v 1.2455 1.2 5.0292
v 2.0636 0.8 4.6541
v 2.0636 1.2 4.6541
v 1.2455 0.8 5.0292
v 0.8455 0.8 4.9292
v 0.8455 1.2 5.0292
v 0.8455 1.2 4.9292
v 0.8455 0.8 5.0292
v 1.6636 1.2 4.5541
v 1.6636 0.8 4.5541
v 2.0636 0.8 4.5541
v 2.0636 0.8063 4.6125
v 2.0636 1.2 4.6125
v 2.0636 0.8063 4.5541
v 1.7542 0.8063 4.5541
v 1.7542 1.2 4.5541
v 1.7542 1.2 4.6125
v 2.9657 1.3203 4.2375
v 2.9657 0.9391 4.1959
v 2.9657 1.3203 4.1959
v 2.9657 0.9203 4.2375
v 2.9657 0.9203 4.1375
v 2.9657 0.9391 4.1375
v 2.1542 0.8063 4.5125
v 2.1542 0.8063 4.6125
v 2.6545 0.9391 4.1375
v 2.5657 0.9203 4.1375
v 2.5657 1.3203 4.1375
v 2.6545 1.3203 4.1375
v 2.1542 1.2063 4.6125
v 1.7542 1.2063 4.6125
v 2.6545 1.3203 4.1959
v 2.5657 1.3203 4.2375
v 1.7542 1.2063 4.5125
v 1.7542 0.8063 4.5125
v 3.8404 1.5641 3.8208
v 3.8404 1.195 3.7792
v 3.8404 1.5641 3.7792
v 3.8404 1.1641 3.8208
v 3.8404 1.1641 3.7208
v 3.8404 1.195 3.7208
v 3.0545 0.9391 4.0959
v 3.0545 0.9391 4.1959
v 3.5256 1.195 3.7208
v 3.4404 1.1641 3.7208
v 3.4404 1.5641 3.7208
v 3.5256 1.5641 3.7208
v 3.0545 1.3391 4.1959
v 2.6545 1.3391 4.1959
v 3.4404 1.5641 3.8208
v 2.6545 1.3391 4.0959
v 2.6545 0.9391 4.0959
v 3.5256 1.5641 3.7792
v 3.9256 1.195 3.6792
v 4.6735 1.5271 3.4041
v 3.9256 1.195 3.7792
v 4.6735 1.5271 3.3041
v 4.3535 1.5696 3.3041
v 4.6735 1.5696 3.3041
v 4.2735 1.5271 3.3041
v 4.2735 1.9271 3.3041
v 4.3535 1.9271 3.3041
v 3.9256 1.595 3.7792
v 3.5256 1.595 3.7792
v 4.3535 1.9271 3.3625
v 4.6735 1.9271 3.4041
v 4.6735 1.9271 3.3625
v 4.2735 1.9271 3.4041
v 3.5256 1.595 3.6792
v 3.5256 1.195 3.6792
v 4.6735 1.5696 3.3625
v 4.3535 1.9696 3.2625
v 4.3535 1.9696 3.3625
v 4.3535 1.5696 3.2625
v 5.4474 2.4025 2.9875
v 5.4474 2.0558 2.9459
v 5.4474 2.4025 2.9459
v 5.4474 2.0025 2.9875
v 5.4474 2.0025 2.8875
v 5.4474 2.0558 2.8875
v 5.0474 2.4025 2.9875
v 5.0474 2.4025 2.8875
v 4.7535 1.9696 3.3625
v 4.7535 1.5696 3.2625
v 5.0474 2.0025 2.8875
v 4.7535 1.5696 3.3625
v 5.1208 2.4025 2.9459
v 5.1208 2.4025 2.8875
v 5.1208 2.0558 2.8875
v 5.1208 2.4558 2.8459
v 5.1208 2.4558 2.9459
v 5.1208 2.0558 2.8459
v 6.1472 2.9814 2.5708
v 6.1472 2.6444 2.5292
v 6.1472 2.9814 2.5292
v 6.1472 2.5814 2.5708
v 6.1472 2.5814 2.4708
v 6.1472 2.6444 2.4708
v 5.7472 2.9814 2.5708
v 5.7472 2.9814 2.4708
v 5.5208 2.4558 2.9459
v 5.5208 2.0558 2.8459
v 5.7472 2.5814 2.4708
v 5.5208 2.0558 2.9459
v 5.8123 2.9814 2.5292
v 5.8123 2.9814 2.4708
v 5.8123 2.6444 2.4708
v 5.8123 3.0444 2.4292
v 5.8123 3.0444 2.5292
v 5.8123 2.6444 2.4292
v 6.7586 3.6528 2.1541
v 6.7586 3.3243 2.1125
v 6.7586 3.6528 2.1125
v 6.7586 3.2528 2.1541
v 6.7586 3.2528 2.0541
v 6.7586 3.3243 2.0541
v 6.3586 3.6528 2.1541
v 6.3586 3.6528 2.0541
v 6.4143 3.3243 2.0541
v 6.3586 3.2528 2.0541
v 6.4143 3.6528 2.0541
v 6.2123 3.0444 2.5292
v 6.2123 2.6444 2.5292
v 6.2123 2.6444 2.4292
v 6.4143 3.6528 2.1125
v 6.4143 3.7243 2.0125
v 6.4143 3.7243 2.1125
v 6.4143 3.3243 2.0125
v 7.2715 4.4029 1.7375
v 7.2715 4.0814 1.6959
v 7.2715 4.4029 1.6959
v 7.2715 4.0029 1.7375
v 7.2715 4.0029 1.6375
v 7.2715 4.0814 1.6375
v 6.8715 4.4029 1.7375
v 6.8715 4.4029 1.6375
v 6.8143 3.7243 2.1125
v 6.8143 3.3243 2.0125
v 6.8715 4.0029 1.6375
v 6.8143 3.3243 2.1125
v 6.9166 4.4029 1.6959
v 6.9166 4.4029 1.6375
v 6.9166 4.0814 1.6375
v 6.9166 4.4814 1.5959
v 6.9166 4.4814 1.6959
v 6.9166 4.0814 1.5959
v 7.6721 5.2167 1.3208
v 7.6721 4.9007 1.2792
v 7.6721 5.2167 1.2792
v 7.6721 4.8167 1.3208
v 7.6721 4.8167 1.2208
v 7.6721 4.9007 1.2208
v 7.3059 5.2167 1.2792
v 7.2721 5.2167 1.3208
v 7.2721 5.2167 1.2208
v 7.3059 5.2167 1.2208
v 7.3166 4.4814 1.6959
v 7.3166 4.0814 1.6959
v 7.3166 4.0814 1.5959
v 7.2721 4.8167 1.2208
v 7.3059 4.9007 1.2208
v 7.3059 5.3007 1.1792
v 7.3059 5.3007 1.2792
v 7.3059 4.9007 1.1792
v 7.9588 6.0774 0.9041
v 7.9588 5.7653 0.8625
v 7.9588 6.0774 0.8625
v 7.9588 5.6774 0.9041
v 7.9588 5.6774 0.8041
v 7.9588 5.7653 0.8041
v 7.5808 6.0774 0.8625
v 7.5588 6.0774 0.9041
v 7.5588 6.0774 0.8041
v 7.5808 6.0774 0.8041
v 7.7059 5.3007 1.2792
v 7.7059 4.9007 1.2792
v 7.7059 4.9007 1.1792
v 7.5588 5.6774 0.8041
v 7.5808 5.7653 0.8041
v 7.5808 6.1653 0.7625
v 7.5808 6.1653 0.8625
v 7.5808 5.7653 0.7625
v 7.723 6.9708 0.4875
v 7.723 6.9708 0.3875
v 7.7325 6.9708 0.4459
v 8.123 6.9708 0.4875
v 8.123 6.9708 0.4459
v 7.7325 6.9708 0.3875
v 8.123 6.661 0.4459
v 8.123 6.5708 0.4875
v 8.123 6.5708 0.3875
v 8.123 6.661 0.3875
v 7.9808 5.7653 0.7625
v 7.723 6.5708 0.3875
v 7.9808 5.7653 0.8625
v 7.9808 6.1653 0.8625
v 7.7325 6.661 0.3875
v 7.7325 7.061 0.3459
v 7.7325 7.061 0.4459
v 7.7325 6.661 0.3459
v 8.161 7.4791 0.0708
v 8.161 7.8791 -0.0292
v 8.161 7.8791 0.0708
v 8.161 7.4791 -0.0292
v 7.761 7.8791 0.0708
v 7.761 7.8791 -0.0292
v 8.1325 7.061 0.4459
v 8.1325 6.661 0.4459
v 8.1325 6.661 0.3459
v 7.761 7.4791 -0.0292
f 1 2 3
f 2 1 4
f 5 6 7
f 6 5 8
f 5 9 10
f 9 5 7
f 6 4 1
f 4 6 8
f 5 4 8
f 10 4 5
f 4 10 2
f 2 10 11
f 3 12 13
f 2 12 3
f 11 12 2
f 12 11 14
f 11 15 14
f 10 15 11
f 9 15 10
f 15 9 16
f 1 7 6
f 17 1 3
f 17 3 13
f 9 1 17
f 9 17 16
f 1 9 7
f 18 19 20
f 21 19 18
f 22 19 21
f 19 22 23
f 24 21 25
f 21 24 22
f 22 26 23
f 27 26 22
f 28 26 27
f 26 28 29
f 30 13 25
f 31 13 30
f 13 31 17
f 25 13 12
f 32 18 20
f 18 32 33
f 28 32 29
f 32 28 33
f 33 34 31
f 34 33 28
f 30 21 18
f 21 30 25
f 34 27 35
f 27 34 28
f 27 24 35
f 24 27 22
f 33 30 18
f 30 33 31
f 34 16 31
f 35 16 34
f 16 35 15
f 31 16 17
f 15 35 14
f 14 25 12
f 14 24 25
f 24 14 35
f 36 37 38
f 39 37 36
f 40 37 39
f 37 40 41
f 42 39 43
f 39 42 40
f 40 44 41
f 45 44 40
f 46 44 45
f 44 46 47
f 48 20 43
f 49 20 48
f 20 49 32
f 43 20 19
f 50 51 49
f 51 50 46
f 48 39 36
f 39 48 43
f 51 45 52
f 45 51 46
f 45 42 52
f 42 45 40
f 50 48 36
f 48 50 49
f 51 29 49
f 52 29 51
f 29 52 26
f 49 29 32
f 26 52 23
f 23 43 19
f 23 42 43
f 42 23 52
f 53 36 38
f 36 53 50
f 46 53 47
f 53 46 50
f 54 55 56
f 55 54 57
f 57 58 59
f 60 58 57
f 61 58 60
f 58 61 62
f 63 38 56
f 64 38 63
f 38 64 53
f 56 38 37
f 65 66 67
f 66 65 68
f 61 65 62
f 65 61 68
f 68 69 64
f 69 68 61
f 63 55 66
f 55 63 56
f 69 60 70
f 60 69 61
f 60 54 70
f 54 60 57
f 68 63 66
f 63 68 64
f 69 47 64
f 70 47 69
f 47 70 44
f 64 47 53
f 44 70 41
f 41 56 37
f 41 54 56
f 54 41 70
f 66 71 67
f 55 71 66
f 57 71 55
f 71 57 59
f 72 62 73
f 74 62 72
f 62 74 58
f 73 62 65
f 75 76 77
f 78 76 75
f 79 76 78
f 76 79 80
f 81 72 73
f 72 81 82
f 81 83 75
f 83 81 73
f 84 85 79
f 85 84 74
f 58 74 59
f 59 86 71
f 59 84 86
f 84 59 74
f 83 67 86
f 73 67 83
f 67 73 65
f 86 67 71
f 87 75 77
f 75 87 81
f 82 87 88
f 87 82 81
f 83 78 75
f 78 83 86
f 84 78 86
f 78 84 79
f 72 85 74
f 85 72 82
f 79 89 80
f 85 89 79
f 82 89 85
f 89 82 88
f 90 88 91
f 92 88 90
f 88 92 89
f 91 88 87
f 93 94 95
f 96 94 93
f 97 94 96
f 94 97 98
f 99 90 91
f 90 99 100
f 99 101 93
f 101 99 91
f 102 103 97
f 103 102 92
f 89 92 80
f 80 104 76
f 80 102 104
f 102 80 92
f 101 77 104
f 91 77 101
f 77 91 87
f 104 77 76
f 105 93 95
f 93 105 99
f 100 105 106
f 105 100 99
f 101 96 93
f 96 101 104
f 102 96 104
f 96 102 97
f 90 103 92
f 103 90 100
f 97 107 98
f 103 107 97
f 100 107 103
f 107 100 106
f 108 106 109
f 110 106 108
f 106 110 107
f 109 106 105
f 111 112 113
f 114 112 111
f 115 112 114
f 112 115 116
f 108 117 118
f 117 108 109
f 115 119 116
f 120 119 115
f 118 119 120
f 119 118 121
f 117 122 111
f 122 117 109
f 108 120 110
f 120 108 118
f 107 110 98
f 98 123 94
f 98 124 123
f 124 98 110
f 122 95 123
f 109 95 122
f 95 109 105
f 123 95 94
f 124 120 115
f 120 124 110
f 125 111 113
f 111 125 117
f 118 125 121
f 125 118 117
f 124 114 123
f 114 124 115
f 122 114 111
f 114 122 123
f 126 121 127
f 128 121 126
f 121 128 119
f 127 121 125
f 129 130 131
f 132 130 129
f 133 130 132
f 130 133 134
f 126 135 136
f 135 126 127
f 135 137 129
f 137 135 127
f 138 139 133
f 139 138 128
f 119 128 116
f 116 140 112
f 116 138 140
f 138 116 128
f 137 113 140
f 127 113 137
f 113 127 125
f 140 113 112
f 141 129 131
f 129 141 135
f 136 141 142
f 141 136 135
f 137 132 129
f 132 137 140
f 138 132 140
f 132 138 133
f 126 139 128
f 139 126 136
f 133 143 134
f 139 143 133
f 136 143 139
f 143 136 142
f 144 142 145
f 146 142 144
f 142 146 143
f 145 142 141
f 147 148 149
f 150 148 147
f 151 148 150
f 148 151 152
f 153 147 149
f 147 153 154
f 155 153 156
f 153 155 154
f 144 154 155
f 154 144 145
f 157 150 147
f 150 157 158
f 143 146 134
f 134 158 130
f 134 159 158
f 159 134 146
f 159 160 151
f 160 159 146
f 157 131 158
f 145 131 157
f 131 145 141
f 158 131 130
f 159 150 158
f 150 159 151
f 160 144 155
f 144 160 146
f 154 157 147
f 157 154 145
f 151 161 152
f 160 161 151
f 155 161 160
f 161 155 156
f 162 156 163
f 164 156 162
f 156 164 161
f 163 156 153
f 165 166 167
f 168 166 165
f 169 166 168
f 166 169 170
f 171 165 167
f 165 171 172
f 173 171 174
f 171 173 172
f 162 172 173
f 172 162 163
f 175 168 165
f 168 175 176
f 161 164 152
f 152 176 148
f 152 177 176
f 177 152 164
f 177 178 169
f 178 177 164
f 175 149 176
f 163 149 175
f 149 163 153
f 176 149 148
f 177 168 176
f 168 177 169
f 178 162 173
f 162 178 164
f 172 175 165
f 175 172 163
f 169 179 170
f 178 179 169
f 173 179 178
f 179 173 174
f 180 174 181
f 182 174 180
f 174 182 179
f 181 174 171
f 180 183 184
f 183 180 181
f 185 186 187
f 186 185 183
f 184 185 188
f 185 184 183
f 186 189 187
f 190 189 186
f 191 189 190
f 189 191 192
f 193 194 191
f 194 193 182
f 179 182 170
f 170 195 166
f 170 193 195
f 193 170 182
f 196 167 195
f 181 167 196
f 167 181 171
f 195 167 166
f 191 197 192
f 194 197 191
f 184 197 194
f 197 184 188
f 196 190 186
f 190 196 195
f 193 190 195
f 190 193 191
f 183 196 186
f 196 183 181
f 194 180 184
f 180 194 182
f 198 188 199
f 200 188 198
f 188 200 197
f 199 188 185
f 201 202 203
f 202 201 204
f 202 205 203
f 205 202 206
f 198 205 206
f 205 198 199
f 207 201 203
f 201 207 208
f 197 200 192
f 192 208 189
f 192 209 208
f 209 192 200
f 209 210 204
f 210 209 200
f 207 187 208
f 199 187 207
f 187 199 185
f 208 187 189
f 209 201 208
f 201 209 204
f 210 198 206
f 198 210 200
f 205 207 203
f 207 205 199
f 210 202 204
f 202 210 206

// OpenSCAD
hull() {
    translate([1.045455, 1.0, 4.979165]) cube([0.4, 0.4, 0.1], center=true);
    translate([1.863645, 1.0, 4.604135]) cube([0.4, 0.4, 0.1], center=true);
}


hull() {
    translate([1.954185, 1.00633, 4.56247]) cube([0.4, 0.4, 0.1], center=true);
    translate([2.765715, 1.12027, 4.18753]) cube([0.4, 0.4, 0.1], center=true);
}


hull() {
    translate([2.8544650000000003, 1.1391, 4.145865]) cube([0.4, 0.4, 0.1], center=true);
    translate([3.640435, 1.3641, 3.770835]) cube([0.4, 0.4, 0.1], center=true);
}


hull() {
    translate([3.725645, 1.3950500000000001, 3.729165]) cube([0.4, 0.4, 0.1], center=true);
    translate([4.4734549999999995, 1.72715, 3.354135]) cube([0.4, 0.4, 0.1], center=true);
}


hull() {
    translate([4.5535499999999995, 1.76965, 3.31247]) cube([0.4, 0.4, 0.1], center=true);
    translate([5.24745, 2.20255, 2.93753]) cube([0.4, 0.4, 0.1], center=true);
}


hull() {
    translate([5.320799999999999, 2.2558000000000002, 2.895865]) cube([0.4, 0.4, 0.1], center=true);
    translate([5.9472, 2.7814, 2.520835]) cube([0.4, 0.4, 0.1], center=true);
}


hull() {
    translate([6.012345, 2.8444, 2.479165]) cube([0.4, 0.4, 0.1], center=true);
    translate([6.558555, 3.4528000000000003, 2.104135]) cube([0.4, 0.4, 0.1], center=true);
}


hull() {
    translate([6.6143, 3.5243, 2.0624700000000002]) cube([0.4, 0.4, 0.1], center=true);
    translate([7.0714999999999995, 4.2029, 1.6875300000000002]) cube([0.4, 0.4, 0.1], center=true);
}


hull() {
    translate([7.11665, 4.2814499999999995, 1.6458650000000001]) cube([0.4, 0.4, 0.1], center=true);
    translate([7.472150000000001, 5.01675, 1.270835]) cube([0.4, 0.4, 0.1], center=true);
}


hull() {
    translate([7.50595, 5.100750000000001, 1.229165]) cube([0.4, 0.4, 0.1], center=true);
    translate([7.758850000000001, 5.8774500000000005, 0.8541350000000001]) cube([0.4, 0.4, 0.1], center=true);
}


hull() {
    translate([7.7808, 5.965350000000001, 0.81247]) cube([0.4, 0.4, 0.1], center=true);
    translate([7.923, 6.770849999999999, 0.43753000000000003]) cube([0.4, 0.4, 0.1], center=true);
}


hull() {
    translate([7.932485, 6.86105, 0.395865]) cube([0.4, 0.4, 0.1], center=true);
    translate([7.961015, 7.67915, 0.020835000000000003]) cube([0.4, 0.4, 0.1], center=true);
}
